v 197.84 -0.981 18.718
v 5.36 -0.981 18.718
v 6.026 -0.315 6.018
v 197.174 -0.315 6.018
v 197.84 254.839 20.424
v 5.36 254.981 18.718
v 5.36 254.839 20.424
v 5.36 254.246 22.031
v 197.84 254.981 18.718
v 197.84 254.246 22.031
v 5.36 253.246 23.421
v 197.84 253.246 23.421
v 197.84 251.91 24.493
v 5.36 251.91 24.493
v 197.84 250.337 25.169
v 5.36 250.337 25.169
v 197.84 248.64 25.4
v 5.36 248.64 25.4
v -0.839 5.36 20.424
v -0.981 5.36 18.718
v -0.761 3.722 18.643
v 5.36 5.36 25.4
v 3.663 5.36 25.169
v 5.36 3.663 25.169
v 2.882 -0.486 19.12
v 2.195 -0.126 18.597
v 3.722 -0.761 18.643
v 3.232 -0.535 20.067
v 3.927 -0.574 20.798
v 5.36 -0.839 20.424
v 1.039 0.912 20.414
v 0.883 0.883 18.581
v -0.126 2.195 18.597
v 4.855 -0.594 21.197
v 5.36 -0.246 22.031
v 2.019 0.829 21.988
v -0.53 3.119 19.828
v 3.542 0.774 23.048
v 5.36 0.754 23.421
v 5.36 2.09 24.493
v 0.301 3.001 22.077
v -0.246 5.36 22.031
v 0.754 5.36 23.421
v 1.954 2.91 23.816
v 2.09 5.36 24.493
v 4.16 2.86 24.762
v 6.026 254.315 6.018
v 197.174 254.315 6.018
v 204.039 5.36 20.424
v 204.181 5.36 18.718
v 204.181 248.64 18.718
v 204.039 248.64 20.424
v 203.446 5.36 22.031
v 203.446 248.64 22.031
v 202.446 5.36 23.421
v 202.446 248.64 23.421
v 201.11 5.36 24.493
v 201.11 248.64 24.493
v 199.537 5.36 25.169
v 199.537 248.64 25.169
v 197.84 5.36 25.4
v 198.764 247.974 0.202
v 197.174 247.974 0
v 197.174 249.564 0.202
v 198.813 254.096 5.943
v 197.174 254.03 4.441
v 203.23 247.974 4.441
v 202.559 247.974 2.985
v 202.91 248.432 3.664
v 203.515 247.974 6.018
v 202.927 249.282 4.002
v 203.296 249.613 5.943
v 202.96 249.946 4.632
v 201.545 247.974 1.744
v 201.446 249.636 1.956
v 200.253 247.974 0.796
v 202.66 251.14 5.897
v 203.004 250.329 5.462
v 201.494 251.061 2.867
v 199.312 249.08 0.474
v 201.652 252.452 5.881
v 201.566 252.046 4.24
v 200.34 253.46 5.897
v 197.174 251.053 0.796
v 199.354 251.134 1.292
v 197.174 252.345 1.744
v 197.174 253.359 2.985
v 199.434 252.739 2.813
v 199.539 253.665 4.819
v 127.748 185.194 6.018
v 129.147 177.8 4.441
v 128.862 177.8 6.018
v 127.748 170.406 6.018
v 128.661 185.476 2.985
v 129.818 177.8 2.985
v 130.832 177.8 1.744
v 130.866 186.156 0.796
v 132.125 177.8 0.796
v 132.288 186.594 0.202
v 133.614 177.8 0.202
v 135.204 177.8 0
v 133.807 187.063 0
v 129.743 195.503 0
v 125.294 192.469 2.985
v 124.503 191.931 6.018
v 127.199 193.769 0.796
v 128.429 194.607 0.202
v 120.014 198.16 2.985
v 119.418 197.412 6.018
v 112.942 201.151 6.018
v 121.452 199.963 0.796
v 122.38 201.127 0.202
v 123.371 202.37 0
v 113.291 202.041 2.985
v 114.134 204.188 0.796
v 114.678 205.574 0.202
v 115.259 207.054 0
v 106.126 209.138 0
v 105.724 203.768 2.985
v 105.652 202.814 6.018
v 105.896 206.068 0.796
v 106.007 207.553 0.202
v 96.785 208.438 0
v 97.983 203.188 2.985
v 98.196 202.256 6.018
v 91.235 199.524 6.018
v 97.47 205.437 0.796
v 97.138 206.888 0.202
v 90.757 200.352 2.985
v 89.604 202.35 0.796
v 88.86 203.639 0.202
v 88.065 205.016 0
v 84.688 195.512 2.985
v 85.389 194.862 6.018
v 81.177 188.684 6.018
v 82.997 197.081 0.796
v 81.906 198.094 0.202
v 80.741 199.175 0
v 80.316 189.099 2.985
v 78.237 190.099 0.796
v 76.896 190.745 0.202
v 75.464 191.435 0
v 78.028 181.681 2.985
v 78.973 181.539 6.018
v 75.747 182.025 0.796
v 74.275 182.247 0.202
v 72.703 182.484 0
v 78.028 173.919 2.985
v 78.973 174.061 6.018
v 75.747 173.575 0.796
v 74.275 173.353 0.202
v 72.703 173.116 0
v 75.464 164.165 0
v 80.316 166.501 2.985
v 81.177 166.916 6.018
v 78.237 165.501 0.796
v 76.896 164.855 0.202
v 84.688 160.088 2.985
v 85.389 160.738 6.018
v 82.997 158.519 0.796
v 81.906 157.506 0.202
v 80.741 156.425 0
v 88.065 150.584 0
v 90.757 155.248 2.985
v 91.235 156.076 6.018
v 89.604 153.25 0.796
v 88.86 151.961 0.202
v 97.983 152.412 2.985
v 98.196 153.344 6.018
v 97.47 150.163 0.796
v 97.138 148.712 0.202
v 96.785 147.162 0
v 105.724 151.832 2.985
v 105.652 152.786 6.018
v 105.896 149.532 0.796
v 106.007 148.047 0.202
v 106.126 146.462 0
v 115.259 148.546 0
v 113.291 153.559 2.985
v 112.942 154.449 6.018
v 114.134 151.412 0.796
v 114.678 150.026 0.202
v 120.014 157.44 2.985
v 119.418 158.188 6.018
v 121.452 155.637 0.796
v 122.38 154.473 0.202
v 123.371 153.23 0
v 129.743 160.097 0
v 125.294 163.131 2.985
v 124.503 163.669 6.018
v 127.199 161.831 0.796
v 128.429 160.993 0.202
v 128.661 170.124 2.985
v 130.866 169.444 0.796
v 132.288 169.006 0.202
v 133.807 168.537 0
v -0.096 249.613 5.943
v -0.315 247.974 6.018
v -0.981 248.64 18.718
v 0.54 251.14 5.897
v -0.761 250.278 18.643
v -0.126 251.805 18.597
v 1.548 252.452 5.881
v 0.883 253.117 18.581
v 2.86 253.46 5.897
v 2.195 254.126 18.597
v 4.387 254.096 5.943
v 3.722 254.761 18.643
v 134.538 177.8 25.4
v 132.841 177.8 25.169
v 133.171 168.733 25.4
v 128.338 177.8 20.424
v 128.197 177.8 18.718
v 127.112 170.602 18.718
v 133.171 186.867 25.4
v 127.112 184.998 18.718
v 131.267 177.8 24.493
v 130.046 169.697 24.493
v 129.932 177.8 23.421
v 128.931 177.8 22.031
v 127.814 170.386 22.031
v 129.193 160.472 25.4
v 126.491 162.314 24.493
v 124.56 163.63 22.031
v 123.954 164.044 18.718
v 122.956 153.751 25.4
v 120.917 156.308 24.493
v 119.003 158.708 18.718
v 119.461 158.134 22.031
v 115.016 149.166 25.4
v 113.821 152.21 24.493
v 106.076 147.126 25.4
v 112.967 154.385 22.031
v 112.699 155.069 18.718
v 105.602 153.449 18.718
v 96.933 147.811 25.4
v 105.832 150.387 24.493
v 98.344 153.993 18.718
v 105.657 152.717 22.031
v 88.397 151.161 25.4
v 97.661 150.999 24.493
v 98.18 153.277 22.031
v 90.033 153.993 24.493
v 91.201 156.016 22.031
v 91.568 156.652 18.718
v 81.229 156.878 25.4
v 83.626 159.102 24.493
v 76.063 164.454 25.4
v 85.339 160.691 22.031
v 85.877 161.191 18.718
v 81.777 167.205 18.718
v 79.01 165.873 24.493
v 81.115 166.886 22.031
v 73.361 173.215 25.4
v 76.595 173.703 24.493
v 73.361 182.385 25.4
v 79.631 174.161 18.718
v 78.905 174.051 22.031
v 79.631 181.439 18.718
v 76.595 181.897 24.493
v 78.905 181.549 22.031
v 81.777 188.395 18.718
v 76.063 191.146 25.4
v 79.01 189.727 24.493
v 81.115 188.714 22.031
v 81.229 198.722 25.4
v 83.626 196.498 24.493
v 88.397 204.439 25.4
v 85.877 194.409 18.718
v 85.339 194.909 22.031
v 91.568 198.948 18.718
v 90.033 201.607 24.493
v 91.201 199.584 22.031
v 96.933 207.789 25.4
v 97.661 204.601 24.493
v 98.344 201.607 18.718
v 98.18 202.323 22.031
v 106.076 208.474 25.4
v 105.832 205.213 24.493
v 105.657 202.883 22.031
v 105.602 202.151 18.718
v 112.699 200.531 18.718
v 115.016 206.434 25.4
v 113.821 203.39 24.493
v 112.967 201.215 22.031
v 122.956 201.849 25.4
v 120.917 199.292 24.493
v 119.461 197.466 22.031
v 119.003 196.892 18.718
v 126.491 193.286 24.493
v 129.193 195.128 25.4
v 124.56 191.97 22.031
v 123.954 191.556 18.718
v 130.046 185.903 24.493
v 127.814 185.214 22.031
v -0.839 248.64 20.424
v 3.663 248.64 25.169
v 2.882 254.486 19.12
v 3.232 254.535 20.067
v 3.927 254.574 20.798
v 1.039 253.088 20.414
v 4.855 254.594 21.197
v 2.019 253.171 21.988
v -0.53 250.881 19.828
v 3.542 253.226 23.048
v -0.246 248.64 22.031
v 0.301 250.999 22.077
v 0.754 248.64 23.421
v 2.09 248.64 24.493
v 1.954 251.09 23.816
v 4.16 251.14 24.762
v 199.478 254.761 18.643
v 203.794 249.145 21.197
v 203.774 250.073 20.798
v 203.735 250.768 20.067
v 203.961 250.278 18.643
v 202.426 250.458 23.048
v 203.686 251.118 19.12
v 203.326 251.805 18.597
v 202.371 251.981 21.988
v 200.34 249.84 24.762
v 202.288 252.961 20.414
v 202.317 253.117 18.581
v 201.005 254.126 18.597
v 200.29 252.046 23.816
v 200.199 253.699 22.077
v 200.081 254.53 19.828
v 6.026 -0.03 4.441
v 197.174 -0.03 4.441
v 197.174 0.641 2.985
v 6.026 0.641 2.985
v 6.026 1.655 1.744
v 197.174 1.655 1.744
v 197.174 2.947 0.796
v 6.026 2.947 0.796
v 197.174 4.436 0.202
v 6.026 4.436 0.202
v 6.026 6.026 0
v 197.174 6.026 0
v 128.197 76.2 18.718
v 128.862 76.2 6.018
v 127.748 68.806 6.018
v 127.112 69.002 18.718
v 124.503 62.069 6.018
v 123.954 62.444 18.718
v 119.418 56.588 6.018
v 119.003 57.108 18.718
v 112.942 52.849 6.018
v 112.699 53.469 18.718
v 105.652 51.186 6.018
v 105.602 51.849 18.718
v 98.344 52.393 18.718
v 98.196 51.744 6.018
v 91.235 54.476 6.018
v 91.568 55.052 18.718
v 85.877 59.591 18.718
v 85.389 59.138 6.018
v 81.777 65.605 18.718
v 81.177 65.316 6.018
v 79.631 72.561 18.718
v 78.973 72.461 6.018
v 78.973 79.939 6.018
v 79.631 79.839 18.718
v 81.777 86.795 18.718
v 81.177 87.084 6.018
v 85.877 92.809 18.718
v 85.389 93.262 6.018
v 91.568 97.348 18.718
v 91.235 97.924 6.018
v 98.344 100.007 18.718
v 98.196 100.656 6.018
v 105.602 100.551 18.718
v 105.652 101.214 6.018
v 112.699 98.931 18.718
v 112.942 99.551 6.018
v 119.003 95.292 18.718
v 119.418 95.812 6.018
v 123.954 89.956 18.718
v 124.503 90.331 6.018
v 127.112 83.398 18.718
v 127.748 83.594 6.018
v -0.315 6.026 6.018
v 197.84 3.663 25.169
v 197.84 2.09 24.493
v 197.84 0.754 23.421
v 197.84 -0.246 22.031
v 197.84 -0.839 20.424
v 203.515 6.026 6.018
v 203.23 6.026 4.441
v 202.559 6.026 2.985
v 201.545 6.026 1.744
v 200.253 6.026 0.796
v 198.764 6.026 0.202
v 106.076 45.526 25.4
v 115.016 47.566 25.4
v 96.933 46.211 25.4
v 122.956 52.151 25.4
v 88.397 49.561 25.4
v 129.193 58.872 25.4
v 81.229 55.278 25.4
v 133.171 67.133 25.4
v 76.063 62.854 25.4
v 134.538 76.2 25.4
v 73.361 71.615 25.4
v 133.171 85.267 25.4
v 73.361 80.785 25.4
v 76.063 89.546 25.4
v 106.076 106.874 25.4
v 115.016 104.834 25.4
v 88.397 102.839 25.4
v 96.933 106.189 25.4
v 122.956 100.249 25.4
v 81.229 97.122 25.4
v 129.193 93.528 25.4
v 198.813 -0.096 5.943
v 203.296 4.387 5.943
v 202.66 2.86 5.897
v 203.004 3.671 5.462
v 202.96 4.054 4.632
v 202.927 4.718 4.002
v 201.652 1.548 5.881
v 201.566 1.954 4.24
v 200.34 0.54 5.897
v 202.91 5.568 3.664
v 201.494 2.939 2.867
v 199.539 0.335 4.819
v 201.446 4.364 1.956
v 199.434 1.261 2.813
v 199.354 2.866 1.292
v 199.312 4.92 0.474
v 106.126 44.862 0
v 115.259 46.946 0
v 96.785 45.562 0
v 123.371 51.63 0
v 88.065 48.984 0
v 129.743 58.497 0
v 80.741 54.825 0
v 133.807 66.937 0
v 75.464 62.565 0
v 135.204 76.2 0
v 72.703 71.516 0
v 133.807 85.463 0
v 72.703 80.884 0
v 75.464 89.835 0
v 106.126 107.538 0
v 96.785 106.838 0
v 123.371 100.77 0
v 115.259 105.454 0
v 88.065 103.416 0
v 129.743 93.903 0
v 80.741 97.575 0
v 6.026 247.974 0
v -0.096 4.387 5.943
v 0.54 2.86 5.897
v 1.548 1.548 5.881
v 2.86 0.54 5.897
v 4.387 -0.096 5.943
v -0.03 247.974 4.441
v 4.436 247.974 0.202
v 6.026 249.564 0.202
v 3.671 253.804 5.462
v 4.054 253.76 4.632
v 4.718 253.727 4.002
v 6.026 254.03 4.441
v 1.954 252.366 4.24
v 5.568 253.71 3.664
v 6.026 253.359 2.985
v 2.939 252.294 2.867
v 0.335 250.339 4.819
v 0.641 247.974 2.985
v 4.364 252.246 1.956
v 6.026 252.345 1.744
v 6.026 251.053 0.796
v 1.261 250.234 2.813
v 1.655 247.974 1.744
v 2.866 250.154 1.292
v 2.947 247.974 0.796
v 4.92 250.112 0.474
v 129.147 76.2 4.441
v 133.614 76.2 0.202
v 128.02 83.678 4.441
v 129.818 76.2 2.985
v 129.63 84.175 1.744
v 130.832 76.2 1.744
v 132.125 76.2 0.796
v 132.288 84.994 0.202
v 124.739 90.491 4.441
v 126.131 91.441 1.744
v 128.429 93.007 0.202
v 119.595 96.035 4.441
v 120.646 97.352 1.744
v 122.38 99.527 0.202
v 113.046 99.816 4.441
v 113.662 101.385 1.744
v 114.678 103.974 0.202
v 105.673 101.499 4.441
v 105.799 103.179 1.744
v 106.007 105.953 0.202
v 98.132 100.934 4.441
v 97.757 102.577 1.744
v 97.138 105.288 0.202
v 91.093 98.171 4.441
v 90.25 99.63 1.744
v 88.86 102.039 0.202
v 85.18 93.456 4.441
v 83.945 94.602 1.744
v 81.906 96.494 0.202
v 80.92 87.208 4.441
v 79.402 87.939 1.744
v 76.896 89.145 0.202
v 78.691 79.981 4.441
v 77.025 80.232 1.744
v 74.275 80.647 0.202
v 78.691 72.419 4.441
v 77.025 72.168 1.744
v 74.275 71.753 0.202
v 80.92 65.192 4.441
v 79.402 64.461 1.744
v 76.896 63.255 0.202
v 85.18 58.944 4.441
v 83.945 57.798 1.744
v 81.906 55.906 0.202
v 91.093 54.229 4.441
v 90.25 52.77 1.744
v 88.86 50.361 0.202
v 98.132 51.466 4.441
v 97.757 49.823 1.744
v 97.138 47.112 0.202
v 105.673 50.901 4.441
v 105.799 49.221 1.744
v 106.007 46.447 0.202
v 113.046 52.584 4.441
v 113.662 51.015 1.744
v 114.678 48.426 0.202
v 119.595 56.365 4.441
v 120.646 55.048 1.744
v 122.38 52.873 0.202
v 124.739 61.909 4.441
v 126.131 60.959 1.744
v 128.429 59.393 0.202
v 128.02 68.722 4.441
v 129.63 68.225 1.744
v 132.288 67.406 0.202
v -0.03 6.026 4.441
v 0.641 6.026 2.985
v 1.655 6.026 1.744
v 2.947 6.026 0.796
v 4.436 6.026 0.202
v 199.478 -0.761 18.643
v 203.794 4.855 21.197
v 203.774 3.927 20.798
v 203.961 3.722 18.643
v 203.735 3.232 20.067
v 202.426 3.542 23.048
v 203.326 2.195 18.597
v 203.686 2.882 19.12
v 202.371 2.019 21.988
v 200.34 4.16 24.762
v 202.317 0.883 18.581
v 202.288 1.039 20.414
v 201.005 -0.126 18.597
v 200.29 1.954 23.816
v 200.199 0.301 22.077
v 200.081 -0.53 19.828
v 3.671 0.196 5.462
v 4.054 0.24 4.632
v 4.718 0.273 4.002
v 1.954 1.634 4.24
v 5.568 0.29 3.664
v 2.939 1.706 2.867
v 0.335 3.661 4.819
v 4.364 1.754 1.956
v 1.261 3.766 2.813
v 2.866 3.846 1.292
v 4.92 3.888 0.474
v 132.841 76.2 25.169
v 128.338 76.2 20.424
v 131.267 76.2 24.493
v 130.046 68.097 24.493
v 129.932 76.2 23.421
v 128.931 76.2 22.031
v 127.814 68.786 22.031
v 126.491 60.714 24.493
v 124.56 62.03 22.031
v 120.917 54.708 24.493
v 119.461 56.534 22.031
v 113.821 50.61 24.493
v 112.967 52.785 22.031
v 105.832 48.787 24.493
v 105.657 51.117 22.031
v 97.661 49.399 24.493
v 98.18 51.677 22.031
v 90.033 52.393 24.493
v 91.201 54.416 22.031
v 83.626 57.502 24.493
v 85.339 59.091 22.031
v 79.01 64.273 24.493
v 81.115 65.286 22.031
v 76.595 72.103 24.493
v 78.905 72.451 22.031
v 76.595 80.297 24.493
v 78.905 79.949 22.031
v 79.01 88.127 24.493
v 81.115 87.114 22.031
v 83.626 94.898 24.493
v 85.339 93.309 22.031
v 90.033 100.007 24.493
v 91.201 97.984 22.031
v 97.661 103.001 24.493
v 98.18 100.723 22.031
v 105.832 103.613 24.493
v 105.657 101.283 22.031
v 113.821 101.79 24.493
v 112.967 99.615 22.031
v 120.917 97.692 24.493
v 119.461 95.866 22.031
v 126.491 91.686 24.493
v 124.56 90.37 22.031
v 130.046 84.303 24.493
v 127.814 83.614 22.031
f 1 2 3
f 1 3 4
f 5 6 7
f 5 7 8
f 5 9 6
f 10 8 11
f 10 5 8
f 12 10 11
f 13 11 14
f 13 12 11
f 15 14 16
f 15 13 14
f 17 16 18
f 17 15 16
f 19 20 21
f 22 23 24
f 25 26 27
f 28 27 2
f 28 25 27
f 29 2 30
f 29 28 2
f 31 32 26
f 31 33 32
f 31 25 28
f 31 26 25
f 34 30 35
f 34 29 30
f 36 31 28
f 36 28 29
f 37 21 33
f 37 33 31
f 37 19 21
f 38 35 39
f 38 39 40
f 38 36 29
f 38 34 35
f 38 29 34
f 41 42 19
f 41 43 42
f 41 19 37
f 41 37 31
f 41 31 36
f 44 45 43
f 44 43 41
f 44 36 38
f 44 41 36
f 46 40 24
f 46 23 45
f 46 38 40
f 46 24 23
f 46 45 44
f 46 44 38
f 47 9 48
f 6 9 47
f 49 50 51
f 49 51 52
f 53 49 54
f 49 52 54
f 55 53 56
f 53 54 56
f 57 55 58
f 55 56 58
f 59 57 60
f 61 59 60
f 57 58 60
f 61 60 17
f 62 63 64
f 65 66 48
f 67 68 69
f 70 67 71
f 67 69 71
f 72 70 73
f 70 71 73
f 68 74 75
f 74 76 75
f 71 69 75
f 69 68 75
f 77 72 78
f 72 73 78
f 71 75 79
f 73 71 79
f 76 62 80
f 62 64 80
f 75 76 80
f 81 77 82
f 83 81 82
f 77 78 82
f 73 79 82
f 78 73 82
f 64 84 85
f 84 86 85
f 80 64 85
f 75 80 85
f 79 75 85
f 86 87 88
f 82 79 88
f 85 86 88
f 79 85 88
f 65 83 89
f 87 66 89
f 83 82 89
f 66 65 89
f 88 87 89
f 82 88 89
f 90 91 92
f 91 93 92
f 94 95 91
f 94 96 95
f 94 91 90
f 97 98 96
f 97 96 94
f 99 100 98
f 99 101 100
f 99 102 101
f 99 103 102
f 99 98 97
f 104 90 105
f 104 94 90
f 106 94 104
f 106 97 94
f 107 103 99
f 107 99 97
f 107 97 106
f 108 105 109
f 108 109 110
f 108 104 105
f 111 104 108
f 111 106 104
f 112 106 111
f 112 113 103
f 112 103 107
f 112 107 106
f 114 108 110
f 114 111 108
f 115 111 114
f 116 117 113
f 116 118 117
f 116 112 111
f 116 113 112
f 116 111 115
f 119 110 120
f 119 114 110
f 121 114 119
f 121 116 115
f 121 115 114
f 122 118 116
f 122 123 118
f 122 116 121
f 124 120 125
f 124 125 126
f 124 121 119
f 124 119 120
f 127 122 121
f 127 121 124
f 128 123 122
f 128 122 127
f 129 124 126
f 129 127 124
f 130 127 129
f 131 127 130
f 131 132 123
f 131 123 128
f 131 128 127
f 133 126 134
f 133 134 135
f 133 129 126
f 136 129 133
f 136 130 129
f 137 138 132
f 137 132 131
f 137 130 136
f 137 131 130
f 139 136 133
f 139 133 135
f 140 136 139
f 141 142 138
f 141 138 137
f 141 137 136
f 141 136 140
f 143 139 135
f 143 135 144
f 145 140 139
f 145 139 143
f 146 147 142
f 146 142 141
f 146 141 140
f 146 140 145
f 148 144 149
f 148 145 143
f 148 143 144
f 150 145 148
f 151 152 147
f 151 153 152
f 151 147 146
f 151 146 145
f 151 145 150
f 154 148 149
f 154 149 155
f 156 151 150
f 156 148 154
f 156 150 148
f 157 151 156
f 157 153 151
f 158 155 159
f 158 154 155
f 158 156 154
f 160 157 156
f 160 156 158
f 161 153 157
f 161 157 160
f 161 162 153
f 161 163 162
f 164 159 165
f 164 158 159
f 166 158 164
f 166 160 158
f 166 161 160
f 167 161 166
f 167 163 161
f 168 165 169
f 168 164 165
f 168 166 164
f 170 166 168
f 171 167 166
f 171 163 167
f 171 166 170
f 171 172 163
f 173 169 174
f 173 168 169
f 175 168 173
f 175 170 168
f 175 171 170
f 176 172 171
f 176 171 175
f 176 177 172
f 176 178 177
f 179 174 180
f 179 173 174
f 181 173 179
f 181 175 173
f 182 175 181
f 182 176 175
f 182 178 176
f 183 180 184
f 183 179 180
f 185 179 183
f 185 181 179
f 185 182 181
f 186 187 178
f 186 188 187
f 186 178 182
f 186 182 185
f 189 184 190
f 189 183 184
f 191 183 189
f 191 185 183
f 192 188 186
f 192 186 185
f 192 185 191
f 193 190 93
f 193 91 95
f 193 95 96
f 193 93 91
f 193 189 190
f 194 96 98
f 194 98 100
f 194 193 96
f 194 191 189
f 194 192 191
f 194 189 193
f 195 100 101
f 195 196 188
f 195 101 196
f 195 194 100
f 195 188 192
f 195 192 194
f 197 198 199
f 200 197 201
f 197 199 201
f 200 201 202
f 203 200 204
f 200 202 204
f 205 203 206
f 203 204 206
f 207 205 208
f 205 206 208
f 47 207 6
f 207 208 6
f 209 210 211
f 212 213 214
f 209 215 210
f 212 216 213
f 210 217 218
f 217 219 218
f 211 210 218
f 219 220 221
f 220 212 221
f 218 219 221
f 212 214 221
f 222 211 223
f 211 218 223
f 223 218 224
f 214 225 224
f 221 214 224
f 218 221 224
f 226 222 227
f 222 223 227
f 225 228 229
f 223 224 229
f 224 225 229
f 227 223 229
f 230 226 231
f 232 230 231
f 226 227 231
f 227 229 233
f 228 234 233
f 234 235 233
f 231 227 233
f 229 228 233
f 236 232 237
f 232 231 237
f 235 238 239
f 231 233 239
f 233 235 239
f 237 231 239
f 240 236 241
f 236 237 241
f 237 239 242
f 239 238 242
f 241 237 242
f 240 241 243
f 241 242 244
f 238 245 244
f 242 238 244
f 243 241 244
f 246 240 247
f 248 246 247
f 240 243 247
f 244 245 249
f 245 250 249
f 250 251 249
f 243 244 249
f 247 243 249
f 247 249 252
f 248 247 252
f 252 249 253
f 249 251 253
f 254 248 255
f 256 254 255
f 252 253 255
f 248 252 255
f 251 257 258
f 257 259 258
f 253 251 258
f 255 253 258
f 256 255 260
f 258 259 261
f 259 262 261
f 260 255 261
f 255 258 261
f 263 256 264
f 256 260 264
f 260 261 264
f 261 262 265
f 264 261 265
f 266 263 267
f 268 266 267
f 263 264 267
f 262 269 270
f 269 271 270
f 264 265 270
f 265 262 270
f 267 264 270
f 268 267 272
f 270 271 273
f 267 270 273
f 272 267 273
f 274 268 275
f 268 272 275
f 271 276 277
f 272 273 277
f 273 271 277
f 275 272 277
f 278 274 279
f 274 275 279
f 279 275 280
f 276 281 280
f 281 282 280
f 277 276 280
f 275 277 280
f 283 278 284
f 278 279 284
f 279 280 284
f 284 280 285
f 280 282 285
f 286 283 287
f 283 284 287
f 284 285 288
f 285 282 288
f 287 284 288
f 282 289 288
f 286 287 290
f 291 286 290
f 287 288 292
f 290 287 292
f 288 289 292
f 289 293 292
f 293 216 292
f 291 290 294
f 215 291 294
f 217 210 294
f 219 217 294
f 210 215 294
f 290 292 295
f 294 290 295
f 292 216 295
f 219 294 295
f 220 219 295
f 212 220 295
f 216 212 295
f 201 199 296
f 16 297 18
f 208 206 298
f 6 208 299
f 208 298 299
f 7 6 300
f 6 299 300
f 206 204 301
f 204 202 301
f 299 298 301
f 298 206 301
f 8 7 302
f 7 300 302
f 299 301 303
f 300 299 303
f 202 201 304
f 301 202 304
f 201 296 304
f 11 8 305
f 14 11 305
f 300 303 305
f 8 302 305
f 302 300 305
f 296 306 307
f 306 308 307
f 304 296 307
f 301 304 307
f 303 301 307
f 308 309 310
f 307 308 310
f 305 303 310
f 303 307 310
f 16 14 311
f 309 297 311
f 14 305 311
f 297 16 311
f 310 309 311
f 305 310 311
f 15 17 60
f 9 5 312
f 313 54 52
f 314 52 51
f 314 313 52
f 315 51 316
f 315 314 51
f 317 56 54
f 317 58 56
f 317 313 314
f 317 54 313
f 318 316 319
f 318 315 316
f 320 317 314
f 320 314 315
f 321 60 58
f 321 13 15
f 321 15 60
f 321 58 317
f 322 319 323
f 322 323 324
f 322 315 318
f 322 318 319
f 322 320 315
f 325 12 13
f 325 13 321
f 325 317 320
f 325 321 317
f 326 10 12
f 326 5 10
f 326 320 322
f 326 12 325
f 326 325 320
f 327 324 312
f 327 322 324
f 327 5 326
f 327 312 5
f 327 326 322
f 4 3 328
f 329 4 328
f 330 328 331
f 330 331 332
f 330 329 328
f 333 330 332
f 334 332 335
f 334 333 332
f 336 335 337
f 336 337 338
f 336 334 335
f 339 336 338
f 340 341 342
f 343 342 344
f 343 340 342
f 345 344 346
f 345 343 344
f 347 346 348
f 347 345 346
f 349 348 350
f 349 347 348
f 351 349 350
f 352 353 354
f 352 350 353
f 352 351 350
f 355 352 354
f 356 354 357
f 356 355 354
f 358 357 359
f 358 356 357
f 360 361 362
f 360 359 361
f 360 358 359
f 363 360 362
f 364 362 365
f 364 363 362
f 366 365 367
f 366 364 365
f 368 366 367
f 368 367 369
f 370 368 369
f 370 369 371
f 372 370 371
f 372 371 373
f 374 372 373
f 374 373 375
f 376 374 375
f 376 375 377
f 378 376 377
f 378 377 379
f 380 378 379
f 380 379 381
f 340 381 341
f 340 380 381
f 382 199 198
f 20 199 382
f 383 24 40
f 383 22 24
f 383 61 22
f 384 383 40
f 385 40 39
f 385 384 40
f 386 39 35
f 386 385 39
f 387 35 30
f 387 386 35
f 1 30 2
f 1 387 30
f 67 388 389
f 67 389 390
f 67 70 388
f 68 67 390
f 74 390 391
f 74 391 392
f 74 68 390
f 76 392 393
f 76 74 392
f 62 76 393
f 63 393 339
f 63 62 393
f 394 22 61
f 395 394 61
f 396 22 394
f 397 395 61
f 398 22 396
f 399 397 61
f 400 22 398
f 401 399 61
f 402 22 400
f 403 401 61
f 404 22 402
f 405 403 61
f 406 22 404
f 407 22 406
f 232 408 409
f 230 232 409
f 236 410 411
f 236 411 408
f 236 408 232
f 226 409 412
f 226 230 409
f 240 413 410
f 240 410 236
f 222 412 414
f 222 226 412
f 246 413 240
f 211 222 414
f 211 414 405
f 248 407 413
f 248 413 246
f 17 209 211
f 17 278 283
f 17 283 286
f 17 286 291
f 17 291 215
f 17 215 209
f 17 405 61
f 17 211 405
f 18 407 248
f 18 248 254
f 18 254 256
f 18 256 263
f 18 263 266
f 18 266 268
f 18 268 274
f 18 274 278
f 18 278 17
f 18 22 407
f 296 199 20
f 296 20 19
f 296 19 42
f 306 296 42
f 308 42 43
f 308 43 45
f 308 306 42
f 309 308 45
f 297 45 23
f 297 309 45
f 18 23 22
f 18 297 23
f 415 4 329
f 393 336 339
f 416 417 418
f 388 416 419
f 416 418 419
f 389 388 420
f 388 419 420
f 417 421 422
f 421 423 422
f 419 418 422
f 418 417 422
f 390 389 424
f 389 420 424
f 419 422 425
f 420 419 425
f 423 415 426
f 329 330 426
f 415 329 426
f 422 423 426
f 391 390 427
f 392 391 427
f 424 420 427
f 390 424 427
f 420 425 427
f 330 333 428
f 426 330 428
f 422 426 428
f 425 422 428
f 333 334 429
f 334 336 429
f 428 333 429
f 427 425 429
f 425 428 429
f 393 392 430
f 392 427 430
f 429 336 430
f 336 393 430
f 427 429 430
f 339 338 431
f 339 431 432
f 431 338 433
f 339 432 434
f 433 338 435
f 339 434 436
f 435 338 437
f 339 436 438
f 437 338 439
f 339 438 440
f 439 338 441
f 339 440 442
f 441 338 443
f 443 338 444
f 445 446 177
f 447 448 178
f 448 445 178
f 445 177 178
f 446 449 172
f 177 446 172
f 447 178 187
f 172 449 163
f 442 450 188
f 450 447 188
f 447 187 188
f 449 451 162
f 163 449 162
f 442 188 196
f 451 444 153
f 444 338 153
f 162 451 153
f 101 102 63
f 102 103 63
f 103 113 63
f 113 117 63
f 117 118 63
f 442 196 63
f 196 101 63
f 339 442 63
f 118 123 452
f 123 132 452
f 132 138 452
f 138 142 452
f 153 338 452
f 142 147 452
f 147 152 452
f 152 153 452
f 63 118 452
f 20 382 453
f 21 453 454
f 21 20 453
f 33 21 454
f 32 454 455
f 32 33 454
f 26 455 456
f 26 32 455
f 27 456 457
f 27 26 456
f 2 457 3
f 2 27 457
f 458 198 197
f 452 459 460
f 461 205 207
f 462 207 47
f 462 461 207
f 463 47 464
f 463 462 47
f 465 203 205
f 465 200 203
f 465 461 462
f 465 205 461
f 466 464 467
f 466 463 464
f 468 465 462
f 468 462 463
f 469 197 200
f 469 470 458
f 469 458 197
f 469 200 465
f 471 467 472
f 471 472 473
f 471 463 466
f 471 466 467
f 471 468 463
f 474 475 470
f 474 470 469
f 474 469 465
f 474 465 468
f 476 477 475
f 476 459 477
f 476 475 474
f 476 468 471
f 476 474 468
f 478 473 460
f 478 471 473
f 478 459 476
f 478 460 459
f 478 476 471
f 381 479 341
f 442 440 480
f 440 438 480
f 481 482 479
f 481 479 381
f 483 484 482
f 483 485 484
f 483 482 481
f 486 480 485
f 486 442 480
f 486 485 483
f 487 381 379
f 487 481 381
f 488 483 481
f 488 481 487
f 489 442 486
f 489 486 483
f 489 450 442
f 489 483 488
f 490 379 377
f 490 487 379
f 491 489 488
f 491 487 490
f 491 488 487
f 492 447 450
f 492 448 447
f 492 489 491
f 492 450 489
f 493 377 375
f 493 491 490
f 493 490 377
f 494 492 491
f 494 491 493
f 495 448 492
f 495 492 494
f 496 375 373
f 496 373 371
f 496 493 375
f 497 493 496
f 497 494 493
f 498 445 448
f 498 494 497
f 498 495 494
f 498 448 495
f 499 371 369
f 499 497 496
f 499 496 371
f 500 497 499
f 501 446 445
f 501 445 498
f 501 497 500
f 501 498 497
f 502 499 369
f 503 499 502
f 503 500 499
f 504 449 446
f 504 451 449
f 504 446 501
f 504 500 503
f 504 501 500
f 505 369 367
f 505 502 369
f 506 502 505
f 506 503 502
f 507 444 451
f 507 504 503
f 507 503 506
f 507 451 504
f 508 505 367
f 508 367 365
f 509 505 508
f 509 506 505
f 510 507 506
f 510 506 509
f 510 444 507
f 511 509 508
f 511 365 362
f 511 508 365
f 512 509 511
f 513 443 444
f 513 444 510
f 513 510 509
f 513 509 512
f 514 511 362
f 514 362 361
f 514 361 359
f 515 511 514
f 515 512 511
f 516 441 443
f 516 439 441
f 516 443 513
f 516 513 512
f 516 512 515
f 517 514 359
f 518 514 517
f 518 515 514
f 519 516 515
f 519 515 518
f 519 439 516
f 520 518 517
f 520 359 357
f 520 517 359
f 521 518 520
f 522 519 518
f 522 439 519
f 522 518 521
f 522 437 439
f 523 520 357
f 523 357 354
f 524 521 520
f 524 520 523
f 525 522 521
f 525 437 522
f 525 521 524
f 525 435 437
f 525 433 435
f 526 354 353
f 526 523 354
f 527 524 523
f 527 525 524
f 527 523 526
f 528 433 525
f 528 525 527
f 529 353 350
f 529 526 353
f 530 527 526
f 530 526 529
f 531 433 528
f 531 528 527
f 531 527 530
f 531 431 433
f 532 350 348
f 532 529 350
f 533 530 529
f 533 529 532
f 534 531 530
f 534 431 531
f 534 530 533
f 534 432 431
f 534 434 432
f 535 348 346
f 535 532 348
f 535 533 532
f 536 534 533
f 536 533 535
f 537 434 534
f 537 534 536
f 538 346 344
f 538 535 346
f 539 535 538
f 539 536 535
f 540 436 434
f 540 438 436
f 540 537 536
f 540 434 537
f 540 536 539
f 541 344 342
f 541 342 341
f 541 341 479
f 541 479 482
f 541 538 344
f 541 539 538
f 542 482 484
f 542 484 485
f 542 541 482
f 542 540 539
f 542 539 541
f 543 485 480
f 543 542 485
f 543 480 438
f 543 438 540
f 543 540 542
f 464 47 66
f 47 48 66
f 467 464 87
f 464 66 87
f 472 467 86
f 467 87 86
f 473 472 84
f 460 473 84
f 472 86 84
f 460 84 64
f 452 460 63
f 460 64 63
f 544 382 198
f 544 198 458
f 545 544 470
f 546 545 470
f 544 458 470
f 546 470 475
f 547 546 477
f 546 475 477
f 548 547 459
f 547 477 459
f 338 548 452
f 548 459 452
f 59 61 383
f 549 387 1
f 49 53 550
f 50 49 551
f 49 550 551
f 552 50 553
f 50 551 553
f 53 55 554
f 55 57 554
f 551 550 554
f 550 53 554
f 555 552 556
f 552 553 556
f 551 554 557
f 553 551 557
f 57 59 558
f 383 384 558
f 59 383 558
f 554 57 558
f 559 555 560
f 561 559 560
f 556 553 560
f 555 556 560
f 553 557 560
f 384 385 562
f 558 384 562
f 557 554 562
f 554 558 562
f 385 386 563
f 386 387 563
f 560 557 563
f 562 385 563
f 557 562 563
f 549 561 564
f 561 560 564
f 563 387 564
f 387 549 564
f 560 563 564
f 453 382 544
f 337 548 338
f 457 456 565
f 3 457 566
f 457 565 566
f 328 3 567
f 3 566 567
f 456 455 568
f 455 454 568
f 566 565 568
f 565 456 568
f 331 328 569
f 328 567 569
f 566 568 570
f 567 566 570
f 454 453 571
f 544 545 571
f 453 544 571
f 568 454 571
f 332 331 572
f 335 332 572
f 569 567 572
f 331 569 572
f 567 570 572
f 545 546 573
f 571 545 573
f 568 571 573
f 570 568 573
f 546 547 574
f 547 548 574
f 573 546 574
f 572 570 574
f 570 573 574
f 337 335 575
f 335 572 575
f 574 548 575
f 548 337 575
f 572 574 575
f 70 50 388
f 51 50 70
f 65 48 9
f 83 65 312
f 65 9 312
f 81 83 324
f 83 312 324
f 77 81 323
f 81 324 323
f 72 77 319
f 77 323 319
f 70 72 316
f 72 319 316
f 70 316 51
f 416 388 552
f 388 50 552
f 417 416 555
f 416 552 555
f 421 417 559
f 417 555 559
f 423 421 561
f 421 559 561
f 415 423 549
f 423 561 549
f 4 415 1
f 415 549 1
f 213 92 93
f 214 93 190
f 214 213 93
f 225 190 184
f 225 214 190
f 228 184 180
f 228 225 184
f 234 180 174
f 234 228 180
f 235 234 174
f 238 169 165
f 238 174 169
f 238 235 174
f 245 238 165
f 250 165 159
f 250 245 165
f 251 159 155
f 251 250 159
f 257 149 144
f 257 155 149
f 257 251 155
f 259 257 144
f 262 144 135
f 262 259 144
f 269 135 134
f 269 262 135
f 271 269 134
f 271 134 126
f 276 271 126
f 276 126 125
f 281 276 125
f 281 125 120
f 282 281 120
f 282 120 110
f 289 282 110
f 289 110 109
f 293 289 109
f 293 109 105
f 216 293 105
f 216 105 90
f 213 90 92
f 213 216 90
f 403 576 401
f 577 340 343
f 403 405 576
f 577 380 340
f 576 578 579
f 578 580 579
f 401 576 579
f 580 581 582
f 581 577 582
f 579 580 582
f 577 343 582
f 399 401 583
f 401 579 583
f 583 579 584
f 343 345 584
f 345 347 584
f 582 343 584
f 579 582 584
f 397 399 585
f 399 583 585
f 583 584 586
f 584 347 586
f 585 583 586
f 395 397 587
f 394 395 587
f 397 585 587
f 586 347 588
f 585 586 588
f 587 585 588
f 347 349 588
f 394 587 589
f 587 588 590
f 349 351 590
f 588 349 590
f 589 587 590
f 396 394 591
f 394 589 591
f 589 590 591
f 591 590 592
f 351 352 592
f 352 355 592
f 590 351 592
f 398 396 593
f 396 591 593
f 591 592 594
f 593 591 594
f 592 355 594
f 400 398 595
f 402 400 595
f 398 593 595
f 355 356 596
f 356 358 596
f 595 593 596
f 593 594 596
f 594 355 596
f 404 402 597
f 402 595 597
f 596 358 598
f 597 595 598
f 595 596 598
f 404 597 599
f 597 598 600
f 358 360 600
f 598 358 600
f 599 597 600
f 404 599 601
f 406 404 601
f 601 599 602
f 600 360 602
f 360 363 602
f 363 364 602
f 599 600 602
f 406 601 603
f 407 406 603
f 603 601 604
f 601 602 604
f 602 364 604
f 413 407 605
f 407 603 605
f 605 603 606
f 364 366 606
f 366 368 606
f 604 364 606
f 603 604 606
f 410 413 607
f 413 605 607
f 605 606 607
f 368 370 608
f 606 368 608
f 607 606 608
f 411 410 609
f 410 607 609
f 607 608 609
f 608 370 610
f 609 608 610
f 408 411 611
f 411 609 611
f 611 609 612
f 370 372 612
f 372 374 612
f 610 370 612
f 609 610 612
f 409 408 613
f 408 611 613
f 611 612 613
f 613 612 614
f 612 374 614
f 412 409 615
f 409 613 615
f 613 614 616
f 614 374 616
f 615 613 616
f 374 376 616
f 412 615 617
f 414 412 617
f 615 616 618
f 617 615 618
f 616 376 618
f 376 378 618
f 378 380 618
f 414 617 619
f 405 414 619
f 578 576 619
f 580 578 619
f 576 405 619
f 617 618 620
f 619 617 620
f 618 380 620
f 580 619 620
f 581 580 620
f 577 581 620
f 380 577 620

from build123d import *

# Parameters (mm, degrees)
F0_W     = 203.2
F0_H     = 254
F0_R     = 25.4
F1_DEPTH = 25.4
F1_TAPER = -3
F2_R     = 6.35


with BuildPart() as f1:
    # F0 (on Top) → F1 (new body)
    with BuildSketch(Plane.XY):
        with Locations((101.6, 127)):
            Rectangle(F0_W, F0_H)
        with Locations((103.7775874138, 76.2)):
            Circle(F0_R, mode=Mode.SUBTRACT)
        with Locations((103.7775874138, 177.8)):
            Circle(F0_R, mode=Mode.SUBTRACT)
    extrude(amount=F1_DEPTH, taper=F1_TAPER)

    # F2
    f2_edges = [f1.edges().sort_by_distance(p)[0] for p in [
        (0, 127, 0),
        (-1.331158, 127, 25.4),
        (-0.665579, 254.665579, 12.7),
        (101.6, 255.331158, 25.4),
        (79.708745, 177.8, 25.4),
        (78.377587, 177.8, 0),
        (128.512009, 177.8, 12.7),
        (-0.665579, -0.665579, 12.7),
        (101.6, -1.331158, 25.4),
        (204.531158, 127, 25.4),
        (79.708745, 76.2, 25.4),
        (78.377587, 76.2, 0),
        (128.512009, 76.2, 12.7),
        (101.6, 0, 0),
        (203.865579, -0.665579, 12.7),
        (101.6, 254, 0),
        (203.2, 127, 0),
        (203.865579, 254.665579, 12.7),
    ]]
    fillet(f2_edges, radius=F2_R)


solid = f1.part
